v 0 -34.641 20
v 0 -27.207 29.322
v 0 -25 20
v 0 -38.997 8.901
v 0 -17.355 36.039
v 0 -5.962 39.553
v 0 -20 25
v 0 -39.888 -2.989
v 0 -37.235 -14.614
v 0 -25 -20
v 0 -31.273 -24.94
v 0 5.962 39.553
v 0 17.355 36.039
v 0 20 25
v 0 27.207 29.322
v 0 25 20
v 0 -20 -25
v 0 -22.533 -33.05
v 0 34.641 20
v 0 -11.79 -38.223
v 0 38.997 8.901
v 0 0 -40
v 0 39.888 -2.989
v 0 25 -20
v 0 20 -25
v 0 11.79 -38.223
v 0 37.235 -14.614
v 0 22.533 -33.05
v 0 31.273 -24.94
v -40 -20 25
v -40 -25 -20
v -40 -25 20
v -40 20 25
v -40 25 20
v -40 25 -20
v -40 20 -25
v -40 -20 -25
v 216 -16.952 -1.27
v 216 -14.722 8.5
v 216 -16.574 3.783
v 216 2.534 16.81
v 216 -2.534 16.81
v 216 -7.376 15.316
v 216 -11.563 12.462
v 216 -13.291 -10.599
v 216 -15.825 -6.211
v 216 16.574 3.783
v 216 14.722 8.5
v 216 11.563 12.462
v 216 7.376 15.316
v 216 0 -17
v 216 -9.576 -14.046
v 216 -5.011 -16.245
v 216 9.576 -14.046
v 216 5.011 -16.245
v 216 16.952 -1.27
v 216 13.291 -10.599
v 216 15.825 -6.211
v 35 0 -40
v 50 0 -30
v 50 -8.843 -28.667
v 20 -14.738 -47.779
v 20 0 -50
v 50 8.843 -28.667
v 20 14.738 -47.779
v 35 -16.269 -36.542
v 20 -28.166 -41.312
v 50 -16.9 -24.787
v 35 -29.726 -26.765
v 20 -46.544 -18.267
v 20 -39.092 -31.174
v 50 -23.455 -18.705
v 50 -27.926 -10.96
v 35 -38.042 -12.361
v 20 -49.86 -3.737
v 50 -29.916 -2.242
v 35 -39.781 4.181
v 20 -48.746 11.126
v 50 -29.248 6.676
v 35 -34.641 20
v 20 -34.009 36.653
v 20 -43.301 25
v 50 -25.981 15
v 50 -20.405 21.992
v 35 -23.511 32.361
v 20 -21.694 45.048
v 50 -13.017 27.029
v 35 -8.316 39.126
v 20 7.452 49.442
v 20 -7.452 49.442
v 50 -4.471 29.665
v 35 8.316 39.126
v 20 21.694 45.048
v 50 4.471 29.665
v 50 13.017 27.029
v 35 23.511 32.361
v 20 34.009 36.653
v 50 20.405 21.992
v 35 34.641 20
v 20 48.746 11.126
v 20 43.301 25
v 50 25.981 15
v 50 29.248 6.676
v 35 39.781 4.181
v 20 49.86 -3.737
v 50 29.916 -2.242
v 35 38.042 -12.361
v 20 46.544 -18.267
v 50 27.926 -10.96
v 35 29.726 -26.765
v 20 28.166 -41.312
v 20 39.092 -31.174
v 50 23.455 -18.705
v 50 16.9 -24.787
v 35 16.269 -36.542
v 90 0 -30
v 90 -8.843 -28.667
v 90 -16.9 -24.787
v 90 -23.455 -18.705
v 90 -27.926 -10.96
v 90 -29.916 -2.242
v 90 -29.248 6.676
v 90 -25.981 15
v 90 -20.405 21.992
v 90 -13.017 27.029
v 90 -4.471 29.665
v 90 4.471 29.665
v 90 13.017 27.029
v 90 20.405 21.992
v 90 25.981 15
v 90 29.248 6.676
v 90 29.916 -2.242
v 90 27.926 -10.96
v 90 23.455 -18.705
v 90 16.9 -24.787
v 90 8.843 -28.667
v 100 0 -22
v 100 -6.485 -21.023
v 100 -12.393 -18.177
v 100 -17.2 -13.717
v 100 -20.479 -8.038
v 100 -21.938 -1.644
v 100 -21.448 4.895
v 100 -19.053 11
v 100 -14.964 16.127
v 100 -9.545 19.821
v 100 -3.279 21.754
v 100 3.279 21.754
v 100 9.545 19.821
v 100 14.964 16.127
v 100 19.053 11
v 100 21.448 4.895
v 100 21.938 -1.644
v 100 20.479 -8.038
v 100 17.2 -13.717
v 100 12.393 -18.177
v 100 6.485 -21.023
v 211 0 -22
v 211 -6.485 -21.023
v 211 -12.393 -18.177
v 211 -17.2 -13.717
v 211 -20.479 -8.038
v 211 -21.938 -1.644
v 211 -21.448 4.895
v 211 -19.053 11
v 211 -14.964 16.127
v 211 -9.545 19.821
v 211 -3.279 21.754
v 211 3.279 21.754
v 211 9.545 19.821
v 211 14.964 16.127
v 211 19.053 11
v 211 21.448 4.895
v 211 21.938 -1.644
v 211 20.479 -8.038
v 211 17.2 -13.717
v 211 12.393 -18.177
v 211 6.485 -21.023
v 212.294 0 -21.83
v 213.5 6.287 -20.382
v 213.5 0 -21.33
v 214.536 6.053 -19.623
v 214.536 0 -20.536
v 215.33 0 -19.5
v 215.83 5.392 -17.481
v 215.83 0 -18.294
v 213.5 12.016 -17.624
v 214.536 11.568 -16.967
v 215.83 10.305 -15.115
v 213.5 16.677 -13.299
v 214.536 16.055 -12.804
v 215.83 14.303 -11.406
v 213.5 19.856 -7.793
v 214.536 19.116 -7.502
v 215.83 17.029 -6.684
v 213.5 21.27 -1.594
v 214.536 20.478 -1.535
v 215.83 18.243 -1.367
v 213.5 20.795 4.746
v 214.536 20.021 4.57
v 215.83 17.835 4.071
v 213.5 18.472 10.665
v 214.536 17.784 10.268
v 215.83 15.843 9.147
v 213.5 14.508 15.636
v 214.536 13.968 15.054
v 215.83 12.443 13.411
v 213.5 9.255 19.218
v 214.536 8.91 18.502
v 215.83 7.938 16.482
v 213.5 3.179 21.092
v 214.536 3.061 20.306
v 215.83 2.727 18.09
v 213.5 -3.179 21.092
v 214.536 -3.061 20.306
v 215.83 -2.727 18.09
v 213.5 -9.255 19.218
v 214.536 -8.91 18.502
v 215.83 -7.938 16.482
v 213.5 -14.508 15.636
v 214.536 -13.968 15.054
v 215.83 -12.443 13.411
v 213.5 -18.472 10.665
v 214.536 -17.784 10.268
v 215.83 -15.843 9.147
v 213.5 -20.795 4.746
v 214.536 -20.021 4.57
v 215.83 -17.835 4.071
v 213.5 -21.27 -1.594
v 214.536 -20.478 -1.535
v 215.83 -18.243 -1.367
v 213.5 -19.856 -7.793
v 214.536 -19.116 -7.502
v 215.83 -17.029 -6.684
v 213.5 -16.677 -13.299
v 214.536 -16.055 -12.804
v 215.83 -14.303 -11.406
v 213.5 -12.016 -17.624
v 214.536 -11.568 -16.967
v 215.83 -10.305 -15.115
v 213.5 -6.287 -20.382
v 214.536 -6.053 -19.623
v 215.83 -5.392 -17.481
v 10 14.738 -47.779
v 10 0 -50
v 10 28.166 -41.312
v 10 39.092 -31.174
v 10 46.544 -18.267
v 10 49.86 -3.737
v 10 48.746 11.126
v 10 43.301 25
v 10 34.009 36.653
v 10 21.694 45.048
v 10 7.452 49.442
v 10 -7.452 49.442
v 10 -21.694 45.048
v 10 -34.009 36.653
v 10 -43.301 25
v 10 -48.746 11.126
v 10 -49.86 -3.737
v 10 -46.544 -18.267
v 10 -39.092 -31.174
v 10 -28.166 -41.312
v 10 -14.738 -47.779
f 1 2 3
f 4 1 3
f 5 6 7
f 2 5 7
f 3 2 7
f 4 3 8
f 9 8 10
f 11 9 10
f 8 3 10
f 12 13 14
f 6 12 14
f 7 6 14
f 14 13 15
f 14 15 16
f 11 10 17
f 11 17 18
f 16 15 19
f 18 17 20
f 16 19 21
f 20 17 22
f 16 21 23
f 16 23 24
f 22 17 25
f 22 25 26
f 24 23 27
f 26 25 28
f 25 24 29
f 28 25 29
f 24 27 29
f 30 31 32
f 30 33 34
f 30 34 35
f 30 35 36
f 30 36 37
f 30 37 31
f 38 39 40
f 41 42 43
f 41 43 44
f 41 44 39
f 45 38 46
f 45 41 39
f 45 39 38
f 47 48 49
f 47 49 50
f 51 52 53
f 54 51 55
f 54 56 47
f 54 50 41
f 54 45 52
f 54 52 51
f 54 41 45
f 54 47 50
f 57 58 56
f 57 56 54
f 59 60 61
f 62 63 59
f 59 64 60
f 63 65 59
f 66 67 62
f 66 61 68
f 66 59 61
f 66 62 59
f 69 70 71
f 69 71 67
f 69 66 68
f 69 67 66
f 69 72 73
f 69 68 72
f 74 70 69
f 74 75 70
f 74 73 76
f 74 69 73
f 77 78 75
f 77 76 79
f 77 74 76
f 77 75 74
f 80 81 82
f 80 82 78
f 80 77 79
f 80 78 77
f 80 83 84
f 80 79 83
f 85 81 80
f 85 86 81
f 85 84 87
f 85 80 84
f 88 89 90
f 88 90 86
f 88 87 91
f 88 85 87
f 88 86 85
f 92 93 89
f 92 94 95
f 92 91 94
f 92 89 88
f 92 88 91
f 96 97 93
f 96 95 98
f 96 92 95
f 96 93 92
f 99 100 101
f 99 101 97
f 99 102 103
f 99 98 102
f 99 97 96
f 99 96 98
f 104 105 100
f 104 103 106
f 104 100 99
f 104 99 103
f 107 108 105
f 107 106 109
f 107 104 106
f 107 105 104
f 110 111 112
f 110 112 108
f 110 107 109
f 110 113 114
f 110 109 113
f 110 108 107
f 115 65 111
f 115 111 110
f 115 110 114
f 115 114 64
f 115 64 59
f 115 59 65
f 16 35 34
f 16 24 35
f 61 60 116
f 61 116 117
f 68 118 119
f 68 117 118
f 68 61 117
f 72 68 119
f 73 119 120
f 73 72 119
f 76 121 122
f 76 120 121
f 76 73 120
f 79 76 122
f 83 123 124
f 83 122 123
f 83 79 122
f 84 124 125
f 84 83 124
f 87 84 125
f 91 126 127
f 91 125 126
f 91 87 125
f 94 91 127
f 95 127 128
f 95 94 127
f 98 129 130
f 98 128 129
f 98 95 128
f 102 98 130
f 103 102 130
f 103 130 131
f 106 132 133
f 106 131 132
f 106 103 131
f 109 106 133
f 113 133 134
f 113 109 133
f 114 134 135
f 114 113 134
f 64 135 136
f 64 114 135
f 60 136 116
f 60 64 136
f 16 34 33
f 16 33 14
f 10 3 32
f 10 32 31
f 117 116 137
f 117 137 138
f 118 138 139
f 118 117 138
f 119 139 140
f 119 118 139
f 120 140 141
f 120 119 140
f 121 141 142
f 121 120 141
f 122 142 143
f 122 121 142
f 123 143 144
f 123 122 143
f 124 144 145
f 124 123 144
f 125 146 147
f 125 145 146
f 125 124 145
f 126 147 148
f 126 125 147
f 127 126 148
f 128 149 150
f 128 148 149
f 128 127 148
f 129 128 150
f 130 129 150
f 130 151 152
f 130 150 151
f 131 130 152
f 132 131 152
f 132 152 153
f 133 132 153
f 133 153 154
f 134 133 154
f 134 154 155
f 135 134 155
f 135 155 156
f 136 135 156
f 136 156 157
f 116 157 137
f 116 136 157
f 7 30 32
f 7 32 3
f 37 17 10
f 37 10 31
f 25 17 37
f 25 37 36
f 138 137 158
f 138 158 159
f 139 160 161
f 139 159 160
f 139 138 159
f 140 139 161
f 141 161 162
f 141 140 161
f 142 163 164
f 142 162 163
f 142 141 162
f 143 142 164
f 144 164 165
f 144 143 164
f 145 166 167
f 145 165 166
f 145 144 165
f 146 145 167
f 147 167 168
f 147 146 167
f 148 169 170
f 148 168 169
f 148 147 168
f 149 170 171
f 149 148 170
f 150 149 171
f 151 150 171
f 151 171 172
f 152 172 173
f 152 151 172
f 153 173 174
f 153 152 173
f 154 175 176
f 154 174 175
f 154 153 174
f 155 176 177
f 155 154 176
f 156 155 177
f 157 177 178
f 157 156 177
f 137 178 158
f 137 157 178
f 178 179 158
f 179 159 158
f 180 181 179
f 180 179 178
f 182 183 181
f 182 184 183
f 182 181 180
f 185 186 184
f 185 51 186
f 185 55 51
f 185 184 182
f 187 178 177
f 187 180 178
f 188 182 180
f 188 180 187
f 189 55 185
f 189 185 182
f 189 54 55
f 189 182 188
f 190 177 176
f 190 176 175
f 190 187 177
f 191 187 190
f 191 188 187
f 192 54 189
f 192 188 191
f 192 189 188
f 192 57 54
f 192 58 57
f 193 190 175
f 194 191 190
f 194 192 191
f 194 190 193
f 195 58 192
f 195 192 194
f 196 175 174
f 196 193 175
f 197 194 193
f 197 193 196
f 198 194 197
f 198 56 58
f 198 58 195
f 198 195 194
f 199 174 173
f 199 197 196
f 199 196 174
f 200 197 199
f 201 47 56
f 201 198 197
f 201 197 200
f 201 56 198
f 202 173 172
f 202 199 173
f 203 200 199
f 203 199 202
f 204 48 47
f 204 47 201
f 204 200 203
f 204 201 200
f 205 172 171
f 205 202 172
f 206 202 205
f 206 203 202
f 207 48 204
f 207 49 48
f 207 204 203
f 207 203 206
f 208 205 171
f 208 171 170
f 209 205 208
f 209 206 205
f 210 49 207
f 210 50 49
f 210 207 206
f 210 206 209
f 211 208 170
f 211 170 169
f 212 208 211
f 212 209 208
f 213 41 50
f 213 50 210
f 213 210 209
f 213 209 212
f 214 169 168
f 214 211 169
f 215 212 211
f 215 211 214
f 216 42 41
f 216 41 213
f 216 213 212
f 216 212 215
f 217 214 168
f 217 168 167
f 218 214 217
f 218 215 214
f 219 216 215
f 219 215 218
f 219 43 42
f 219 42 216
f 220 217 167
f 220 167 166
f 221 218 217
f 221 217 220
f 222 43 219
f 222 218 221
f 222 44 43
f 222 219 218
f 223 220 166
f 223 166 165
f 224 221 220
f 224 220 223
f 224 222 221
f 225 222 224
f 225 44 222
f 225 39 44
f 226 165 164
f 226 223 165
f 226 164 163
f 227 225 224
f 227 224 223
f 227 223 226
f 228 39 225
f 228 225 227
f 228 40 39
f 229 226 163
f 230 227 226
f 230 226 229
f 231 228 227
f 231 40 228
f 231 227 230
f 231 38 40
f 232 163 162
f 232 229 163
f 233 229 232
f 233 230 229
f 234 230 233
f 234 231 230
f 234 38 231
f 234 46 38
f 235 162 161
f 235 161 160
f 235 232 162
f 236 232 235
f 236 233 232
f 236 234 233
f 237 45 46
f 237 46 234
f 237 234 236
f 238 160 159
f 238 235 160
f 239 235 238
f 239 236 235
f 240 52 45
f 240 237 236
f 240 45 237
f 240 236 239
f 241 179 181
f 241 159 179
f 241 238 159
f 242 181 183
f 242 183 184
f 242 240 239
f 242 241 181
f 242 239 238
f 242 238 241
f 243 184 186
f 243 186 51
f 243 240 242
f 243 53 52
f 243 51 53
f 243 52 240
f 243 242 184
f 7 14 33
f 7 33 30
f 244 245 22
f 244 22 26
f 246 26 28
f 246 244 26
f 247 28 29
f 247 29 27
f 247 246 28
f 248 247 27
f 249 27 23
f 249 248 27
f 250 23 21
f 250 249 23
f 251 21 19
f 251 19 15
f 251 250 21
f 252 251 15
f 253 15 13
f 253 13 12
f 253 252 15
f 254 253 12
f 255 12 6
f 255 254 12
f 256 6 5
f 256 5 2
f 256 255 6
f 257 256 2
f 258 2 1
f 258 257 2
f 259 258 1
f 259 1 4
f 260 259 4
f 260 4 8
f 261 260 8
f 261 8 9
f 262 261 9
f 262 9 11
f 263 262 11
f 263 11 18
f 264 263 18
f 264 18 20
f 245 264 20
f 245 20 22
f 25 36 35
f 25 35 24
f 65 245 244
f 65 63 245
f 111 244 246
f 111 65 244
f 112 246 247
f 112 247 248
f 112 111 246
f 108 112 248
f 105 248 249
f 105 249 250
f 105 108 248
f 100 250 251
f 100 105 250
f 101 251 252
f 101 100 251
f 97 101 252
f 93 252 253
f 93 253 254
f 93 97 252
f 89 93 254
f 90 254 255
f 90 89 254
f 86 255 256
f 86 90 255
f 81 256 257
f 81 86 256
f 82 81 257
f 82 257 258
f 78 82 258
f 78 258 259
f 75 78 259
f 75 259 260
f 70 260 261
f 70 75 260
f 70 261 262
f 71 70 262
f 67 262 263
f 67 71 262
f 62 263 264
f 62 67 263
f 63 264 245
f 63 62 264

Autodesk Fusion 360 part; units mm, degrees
sketch "Sketch1" plane through (0, 0, 0) normal (0, 1, 0) x (1, 0, 0) in component "Shaft02"
  line L0 (0, 0) -> (0, 40)
  line L1 (0, 40) -> (10, 50)
  line L2 (0, 40) -> (22.4585, 40) construction
  line L3 (10, 50) -> (10, 0)
  line L4 (0, 0) -> (50, 0)
  line L5 (50, 0) -> (50, 30)
  line L6 (10, 50) -> (20, 50)
  line L7 (20, 50) -> (50, 30)
  line L8 (50, 0) -> (90, 0)
  line L9 (90, 0) -> (90, 30)
  line L10 (90, 30) -> (50, 30)
  line L11 (50, 30) -> (50, 0)
  line L12 (90, 0) -> (100, 0)
  line L13 (90, 30) -> (100, 22)
  line L14 (100, 0) -> (216, 0)
  line L15 (216, 0) -> (216, 22)
  line L16 (216, 22) -> (100, 22)
  line L17 (100, 22) -> (100, 0)
  dimension "d2" = 40
  dimension "d3" = 45
  dimension "d5" = 50
  dimension "d6" = 50
  dimension "d7" = 30
  dimension "d8" = 10
  dimension "d10" = 40
  dimension "d11" = 30
  dimension "d13" = 10
  dimension "d15" = 116
  dimension "d16" = 22
revolve "Revolve1" add sketch "Sketch1" angle 360 about axis through (100, 0, 0) along (1, 0, 0) in component "Shaft02"
sketch "Sketch2" plane through (0, 0, 0) normal (-1, 0, 0) x (0, -1, 0) in component "Shaft02"
  circle A0 centre (0, 0) radius 40
  line L0 (25, -25) -> (-25, -25)
  line L1 (-25, -25) -> (-25, 25)
  line L2 (-25, 25) -> (25, 25)
  line L3 (25, 25) -> (25, -25)
  line L4 (25, -25) -> (-25, 25) construction
  line L5 (-25, -25) -> (25, 25) construction
  dimension "d19" = 50
  dimension "d20" = 50
extrude "Extrude1" add sketch "Sketch2" along normal blind 40 contours L0 L1 L2 L3 in component "Shaft02"
chamfer "Chamfer1" distance 5 angle 45 4 edges at (-20, -25, 25) (-20, 25, 25) (-20, -25, -25) (-20, 25, -25) in component "Shaft02"
fillet "Fillet1" radius 5 1 edges at (216, -7.9555, 20.5112) in component "Shaft02"
component "Shaft02" placed x (1, 0, 0) y (0, 1, 0) z (0, 0, 1) at (0, 0, 0)
